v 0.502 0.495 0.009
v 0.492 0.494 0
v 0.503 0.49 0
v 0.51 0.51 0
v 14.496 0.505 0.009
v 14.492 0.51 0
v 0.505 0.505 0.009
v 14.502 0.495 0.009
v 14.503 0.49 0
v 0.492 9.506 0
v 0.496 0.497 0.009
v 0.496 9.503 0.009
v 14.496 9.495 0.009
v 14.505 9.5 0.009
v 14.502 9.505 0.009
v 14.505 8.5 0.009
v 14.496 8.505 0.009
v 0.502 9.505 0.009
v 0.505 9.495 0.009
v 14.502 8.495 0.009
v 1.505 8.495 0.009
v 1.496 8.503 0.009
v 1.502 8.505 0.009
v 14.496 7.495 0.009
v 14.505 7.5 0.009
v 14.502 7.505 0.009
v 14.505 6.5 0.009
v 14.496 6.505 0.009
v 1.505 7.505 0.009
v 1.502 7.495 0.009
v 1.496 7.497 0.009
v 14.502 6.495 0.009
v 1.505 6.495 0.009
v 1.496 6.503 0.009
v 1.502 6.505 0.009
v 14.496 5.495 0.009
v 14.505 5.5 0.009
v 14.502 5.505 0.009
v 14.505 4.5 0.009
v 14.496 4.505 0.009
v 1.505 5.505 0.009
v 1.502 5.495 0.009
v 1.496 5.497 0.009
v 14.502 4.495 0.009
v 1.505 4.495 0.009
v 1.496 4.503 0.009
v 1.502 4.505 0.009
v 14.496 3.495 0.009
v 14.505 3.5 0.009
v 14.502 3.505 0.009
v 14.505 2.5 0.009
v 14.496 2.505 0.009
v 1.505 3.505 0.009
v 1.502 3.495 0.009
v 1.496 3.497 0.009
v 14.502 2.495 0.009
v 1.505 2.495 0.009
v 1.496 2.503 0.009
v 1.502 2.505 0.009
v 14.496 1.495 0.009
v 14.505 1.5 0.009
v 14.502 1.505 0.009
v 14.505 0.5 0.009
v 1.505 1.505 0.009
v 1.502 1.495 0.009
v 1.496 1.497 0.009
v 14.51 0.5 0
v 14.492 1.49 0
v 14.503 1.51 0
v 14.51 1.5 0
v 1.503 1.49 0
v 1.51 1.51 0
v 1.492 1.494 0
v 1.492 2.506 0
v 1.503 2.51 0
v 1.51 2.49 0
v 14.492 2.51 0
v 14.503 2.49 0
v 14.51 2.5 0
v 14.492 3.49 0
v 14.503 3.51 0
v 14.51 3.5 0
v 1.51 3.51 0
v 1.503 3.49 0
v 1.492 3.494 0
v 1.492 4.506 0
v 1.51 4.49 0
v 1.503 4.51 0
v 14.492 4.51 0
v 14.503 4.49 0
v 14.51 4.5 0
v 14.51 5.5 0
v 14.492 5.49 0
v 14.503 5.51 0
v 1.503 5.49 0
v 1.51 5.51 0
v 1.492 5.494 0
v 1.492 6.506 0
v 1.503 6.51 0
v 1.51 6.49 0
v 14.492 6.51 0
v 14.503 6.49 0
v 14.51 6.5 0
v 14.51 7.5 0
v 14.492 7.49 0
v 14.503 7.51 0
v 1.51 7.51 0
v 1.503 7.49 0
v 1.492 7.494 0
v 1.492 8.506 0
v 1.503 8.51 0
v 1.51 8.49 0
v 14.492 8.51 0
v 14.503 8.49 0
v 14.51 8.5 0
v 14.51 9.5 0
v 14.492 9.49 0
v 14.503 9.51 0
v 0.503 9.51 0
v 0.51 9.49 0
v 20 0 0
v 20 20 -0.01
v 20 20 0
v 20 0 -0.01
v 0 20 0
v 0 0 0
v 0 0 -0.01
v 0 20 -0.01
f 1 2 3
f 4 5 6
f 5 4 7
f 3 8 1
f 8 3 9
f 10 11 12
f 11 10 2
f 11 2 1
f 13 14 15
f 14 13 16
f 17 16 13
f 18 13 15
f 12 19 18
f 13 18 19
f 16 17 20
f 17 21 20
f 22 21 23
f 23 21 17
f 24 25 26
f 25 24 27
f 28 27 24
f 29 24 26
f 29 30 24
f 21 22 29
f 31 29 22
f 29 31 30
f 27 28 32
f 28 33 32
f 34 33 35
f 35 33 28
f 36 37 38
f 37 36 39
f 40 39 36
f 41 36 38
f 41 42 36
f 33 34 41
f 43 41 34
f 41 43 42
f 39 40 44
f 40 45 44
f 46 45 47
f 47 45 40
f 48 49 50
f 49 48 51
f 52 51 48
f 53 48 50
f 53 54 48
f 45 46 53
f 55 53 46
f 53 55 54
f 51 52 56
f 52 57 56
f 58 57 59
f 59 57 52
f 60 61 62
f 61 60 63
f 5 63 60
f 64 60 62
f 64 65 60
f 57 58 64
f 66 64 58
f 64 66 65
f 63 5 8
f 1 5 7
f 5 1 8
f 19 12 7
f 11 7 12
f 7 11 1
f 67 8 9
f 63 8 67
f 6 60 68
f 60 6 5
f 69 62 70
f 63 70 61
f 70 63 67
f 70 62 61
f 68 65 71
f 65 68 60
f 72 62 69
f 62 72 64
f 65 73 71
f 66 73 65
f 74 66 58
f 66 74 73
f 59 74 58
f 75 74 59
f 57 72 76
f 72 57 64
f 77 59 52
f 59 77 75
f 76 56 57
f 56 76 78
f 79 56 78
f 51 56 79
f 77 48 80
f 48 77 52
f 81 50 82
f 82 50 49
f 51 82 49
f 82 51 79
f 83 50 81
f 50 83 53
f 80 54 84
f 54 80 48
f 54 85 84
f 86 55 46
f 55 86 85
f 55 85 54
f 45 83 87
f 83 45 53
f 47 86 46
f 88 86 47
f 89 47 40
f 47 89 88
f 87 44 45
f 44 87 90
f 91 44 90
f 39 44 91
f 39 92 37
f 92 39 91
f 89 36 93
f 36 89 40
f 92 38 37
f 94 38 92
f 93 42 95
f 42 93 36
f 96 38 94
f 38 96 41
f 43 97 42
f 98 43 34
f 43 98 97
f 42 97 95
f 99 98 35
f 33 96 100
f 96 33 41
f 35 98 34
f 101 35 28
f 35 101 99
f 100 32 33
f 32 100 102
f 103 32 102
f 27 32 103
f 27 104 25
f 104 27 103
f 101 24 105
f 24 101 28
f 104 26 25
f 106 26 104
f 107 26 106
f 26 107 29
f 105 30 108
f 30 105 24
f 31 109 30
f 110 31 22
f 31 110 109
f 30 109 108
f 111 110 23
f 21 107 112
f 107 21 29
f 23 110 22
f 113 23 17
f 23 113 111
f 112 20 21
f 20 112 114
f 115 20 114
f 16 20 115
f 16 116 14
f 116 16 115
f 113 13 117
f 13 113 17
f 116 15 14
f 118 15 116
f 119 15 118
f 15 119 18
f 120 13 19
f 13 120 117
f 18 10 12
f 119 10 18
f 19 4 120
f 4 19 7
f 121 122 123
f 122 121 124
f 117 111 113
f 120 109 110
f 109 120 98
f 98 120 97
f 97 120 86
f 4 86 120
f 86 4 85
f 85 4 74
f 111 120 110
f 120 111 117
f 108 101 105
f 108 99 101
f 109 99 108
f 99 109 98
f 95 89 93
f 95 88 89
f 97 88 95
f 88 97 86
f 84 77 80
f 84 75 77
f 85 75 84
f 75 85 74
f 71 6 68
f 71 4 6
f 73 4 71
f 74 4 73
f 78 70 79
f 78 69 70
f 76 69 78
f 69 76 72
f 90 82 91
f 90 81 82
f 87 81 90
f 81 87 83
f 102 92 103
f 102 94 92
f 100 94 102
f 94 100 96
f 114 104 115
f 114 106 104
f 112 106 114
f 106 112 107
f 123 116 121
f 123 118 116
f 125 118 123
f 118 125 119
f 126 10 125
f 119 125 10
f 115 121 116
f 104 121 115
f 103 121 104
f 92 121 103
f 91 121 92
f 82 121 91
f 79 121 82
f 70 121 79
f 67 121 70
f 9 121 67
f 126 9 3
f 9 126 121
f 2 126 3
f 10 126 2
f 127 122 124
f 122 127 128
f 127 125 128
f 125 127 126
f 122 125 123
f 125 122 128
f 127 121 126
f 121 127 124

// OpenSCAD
hull(){
    translate([0.5, 0.5]) sphere(0.01);
    translate([1.5, 0.5]) sphere(0.01);
}
hull(){
    translate([1.5, 0.5]) sphere(0.01);
    translate([2.5, 0.5]) sphere(0.01);
}
hull(){
    translate([2.5, 0.5]) sphere(0.01);
    translate([3.5, 0.5]) sphere(0.01);
}
hull(){
    translate([3.5, 0.5]) sphere(0.01);
    translate([4.5, 0.5]) sphere(0.01);
}
hull(){
    translate([4.5, 0.5]) sphere(0.01);
    translate([5.5, 0.5]) sphere(0.01);
}
hull(){
    translate([5.5, 0.5]) sphere(0.01);
    translate([6.5, 0.5]) sphere(0.01);
}
hull(){
    translate([6.5, 0.5]) sphere(0.01);
    translate([7.5, 0.5]) sphere(0.01);
}
hull(){
    translate([7.5, 0.5]) sphere(0.01);
    translate([8.5, 0.5]) sphere(0.01);
}
hull(){
    translate([8.5, 0.5]) sphere(0.01);
    translate([9.5, 0.5]) sphere(0.01);
}
hull(){
    translate([9.5, 0.5]) sphere(0.01);
    translate([10.5, 0.5]) sphere(0.01);
}
hull(){
    translate([10.5, 0.5]) sphere(0.01);
    translate([11.5, 0.5]) sphere(0.01);
}
hull(){
    translate([11.5, 0.5]) sphere(0.01);
    translate([12.5, 0.5]) sphere(0.01);
}
hull(){
    translate([12.5, 0.5]) sphere(0.01);
    translate([13.5, 0.5]) sphere(0.01);
}
hull(){
    translate([13.5, 0.5]) sphere(0.01);
    translate([14.5, 0.5]) sphere(0.01);
}
hull(){
    translate([14.5, 0.5]) sphere(0.01);
    translate([14.5, 1.5]) sphere(0.01);
}
hull(){
    translate([14.5, 1.5]) sphere(0.01);
    translate([13.5, 1.5]) sphere(0.01);
}
hull(){
    translate([13.5, 1.5]) sphere(0.01);
    translate([12.5, 1.5]) sphere(0.01);
}
hull(){
    translate([12.5, 1.5]) sphere(0.01);
    translate([11.5, 1.5]) sphere(0.01);
}
hull(){
    translate([11.5, 1.5]) sphere(0.01);
    translate([10.5, 1.5]) sphere(0.01);
}
hull(){
    translate([10.5, 1.5]) sphere(0.01);
    translate([9.5, 1.5]) sphere(0.01);
}
hull(){
    translate([9.5, 1.5]) sphere(0.01);
    translate([8.5, 1.5]) sphere(0.01);
}
hull(){
    translate([8.5, 1.5]) sphere(0.01);
    translate([7.5, 1.5]) sphere(0.01);
}
hull(){
    translate([7.5, 1.5]) sphere(0.01);
    translate([6.5, 1.5]) sphere(0.01);
}
hull(){
    translate([6.5, 1.5]) sphere(0.01);
    translate([5.5, 1.5]) sphere(0.01);
}
hull(){
    translate([5.5, 1.5]) sphere(0.01);
    translate([4.5, 1.5]) sphere(0.01);
}
hull(){
    translate([4.5, 1.5]) sphere(0.01);
    translate([3.5, 1.5]) sphere(0.01);
}
hull(){
    translate([3.5, 1.5]) sphere(0.01);
    translate([2.5, 1.5]) sphere(0.01);
}
hull(){
    translate([2.5, 1.5]) sphere(0.01);
    translate([1.5, 1.5]) sphere(0.01);
}
hull(){
    translate([1.5, 1.5]) sphere(0.01);
    translate([1.5, 2.5]) sphere(0.01);
}
hull(){
    translate([1.5, 2.5]) sphere(0.01);
    translate([2.5, 2.5]) sphere(0.01);
}
hull(){
    translate([2.5, 2.5]) sphere(0.01);
    translate([3.5, 2.5]) sphere(0.01);
}
hull(){
    translate([3.5, 2.5]) sphere(0.01);
    translate([4.5, 2.5]) sphere(0.01);
}
hull(){
    translate([4.5, 2.5]) sphere(0.01);
    translate([5.5, 2.5]) sphere(0.01);
}
hull(){
    translate([5.5, 2.5]) sphere(0.01);
    translate([6.5, 2.5]) sphere(0.01);
}
hull(){
    translate([6.5, 2.5]) sphere(0.01);
    translate([7.5, 2.5]) sphere(0.01);
}
hull(){
    translate([7.5, 2.5]) sphere(0.01);
    translate([8.5, 2.5]) sphere(0.01);
}
hull(){
    translate([8.5, 2.5]) sphere(0.01);
    translate([9.5, 2.5]) sphere(0.01);
}
hull(){
    translate([9.5, 2.5]) sphere(0.01);
    translate([10.5, 2.5]) sphere(0.01);
}
hull(){
    translate([10.5, 2.5]) sphere(0.01);
    translate([11.5, 2.5]) sphere(0.01);
}
hull(){
    translate([11.5, 2.5]) sphere(0.01);
    translate([12.5, 2.5]) sphere(0.01);
}
hull(){
    translate([12.5, 2.5]) sphere(0.01);
    translate([13.5, 2.5]) sphere(0.01);
}
hull(){
    translate([13.5, 2.5]) sphere(0.01);
    translate([14.5, 2.5]) sphere(0.01);
}
hull(){
    translate([14.5, 2.5]) sphere(0.01);
    translate([14.5, 3.5]) sphere(0.01);
}
hull(){
    translate([14.5, 3.5]) sphere(0.01);
    translate([13.5, 3.5]) sphere(0.01);
}
hull(){
    translate([13.5, 3.5]) sphere(0.01);
    translate([12.5, 3.5]) sphere(0.01);
}
hull(){
    translate([12.5, 3.5]) sphere(0.01);
    translate([11.5, 3.5]) sphere(0.01);
}
hull(){
    translate([11.5, 3.5]) sphere(0.01);
    translate([10.5, 3.5]) sphere(0.01);
}
hull(){
    translate([10.5, 3.5]) sphere(0.01);
    translate([9.5, 3.5]) sphere(0.01);
}
hull(){
    translate([9.5, 3.5]) sphere(0.01);
    translate([8.5, 3.5]) sphere(0.01);
}
hull(){
    translate([8.5, 3.5]) sphere(0.01);
    translate([7.5, 3.5]) sphere(0.01);
}
hull(){
    translate([7.5, 3.5]) sphere(0.01);
    translate([6.5, 3.5]) sphere(0.01);
}
hull(){
    translate([6.5, 3.5]) sphere(0.01);
    translate([5.5, 3.5]) sphere(0.01);
}
hull(){
    translate([5.5, 3.5]) sphere(0.01);
    translate([4.5, 3.5]) sphere(0.01);
}
hull(){
    translate([4.5, 3.5]) sphere(0.01);
    translate([3.5, 3.5]) sphere(0.01);
}
hull(){
    translate([3.5, 3.5]) sphere(0.01);
    translate([2.5, 3.5]) sphere(0.01);
}
hull(){
    translate([2.5, 3.5]) sphere(0.01);
    translate([1.5, 3.5]) sphere(0.01);
}
hull(){
    translate([1.5, 3.5]) sphere(0.01);
    translate([1.5, 4.5]) sphere(0.01);
}
hull(){
    translate([1.5, 4.5]) sphere(0.01);
    translate([2.5, 4.5]) sphere(0.01);
}
hull(){
    translate([2.5, 4.5]) sphere(0.01);
    translate([3.5, 4.5]) sphere(0.01);
}
hull(){
    translate([3.5, 4.5]) sphere(0.01);
    translate([4.5, 4.5]) sphere(0.01);
}
hull(){
    translate([4.5, 4.5]) sphere(0.01);
    translate([5.5, 4.5]) sphere(0.01);
}
hull(){
    translate([5.5, 4.5]) sphere(0.01);
    translate([6.5, 4.5]) sphere(0.01);
}
hull(){
    translate([6.5, 4.5]) sphere(0.01);
    translate([7.5, 4.5]) sphere(0.01);
}
hull(){
    translate([7.5, 4.5]) sphere(0.01);
    translate([8.5, 4.5]) sphere(0.01);
}
hull(){
    translate([8.5, 4.5]) sphere(0.01);
    translate([9.5, 4.5]) sphere(0.01);
}
hull(){
    translate([9.5, 4.5]) sphere(0.01);
    translate([10.5, 4.5]) sphere(0.01);
}
hull(){
    translate([10.5, 4.5]) sphere(0.01);
    translate([11.5, 4.5]) sphere(0.01);
}
hull(){
    translate([11.5, 4.5]) sphere(0.01);
    translate([12.5, 4.5]) sphere(0.01);
}
hull(){
    translate([12.5, 4.5]) sphere(0.01);
    translate([13.5, 4.5]) sphere(0.01);
}
hull(){
    translate([13.5, 4.5]) sphere(0.01);
    translate([14.5, 4.5]) sphere(0.01);
}
hull(){
    translate([14.5, 4.5]) sphere(0.01);
    translate([14.5, 5.5]) sphere(0.01);
}
hull(){
    translate([14.5, 5.5]) sphere(0.01);
    translate([13.5, 5.5]) sphere(0.01);
}
hull(){
    translate([13.5, 5.5]) sphere(0.01);
    translate([12.5, 5.5]) sphere(0.01);
}
hull(){
    translate([12.5, 5.5]) sphere(0.01);
    translate([11.5, 5.5]) sphere(0.01);
}
hull(){
    translate([11.5, 5.5]) sphere(0.01);
    translate([10.5, 5.5]) sphere(0.01);
}
hull(){
    translate([10.5, 5.5]) sphere(0.01);
    translate([9.5, 5.5]) sphere(0.01);
}
hull(){
    translate([9.5, 5.5]) sphere(0.01);
    translate([8.5, 5.5]) sphere(0.01);
}
hull(){
    translate([8.5, 5.5]) sphere(0.01);
    translate([7.5, 5.5]) sphere(0.01);
}
hull(){
    translate([7.5, 5.5]) sphere(0.01);
    translate([6.5, 5.5]) sphere(0.01);
}
hull(){
    translate([6.5, 5.5]) sphere(0.01);
    translate([5.5, 5.5]) sphere(0.01);
}
hull(){
    translate([5.5, 5.5]) sphere(0.01);
    translate([4.5, 5.5]) sphere(0.01);
}
hull(){
    translate([4.5, 5.5]) sphere(0.01);
    translate([3.5, 5.5]) sphere(0.01);
}
hull(){
    translate([3.5, 5.5]) sphere(0.01);
    translate([2.5, 5.5]) sphere(0.01);
}
hull(){
    translate([2.5, 5.5]) sphere(0.01);
    translate([1.5, 5.5]) sphere(0.01);
}
hull(){
    translate([1.5, 5.5]) sphere(0.01);
    translate([1.5, 6.5]) sphere(0.01);
}
hull(){
    translate([1.5, 6.5]) sphere(0.01);
    translate([2.5, 6.5]) sphere(0.01);
}
hull(){
    translate([2.5, 6.5]) sphere(0.01);
    translate([3.5, 6.5]) sphere(0.01);
}
hull(){
    translate([3.5, 6.5]) sphere(0.01);
    translate([4.5, 6.5]) sphere(0.01);
}
hull(){
    translate([4.5, 6.5]) sphere(0.01);
    translate([5.5, 6.5]) sphere(0.01);
}
hull(){
    translate([5.5, 6.5]) sphere(0.01);
    translate([6.5, 6.5]) sphere(0.01);
}
hull(){
    translate([6.5, 6.5]) sphere(0.01);
    translate([7.5, 6.5]) sphere(0.01);
}
hull(){
    translate([7.5, 6.5]) sphere(0.01);
    translate([8.5, 6.5]) sphere(0.01);
}
hull(){
    translate([8.5, 6.5]) sphere(0.01);
    translate([9.5, 6.5]) sphere(0.01);
}
hull(){
    translate([9.5, 6.5]) sphere(0.01);
    translate([10.5, 6.5]) sphere(0.01);
}
hull(){
    translate([10.5, 6.5]) sphere(0.01);
    translate([11.5, 6.5]) sphere(0.01);
}
hull(){
    translate([11.5, 6.5]) sphere(0.01);
    translate([12.5, 6.5]) sphere(0.01);
}
hull(){
    translate([12.5, 6.5]) sphere(0.01);
    translate([13.5, 6.5]) sphere(0.01);
}
hull(){
    translate([13.5, 6.5]) sphere(0.01);
    translate([14.5, 6.5]) sphere(0.01);
}
hull(){
    translate([14.5, 6.5]) sphere(0.01);
    translate([14.5, 7.5]) sphere(0.01);
}
hull(){
    translate([14.5, 7.5]) sphere(0.01);
    translate([13.5, 7.5]) sphere(0.01);
}
hull(){
    translate([13.5, 7.5]) sphere(0.01);
    translate([12.5, 7.5]) sphere(0.01);
}
hull(){
    translate([12.5, 7.5]) sphere(0.01);
    translate([11.5, 7.5]) sphere(0.01);
}
hull(){
    translate([11.5, 7.5]) sphere(0.01);
    translate([10.5, 7.5]) sphere(0.01);
}
hull(){
    translate([10.5, 7.5]) sphere(0.01);
    translate([9.5, 7.5]) sphere(0.01);
}
hull(){
    translate([9.5, 7.5]) sphere(0.01);
    translate([8.5, 7.5]) sphere(0.01);
}
hull(){
    translate([8.5, 7.5]) sphere(0.01);
    translate([7.5, 7.5]) sphere(0.01);
}
hull(){
    translate([7.5, 7.5]) sphere(0.01);
    translate([6.5, 7.5]) sphere(0.01);
}
hull(){
    translate([6.5, 7.5]) sphere(0.01);
    translate([5.5, 7.5]) sphere(0.01);
}
hull(){
    translate([5.5, 7.5]) sphere(0.01);
    translate([4.5, 7.5]) sphere(0.01);
}
hull(){
    translate([4.5, 7.5]) sphere(0.01);
    translate([3.5, 7.5]) sphere(0.01);
}
hull(){
    translate([3.5, 7.5]) sphere(0.01);
    translate([2.5, 7.5]) sphere(0.01);
}
hull(){
    translate([2.5, 7.5]) sphere(0.01);
    translate([1.5, 7.5]) sphere(0.01);
}
hull(){
    translate([1.5, 7.5]) sphere(0.01);
    translate([1.5, 8.5]) sphere(0.01);
}
hull(){
    translate([1.5, 8.5]) sphere(0.01);
    translate([2.5, 8.5]) sphere(0.01);
}
hull(){
    translate([2.5, 8.5]) sphere(0.01);
    translate([3.5, 8.5]) sphere(0.01);
}
hull(){
    translate([3.5, 8.5]) sphere(0.01);
    translate([4.5, 8.5]) sphere(0.01);
}
hull(){
    translate([4.5, 8.5]) sphere(0.01);
    translate([5.5, 8.5]) sphere(0.01);
}
hull(){
    translate([5.5, 8.5]) sphere(0.01);
    translate([6.5, 8.5]) sphere(0.01);
}
hull(){
    translate([6.5, 8.5]) sphere(0.01);
    translate([7.5, 8.5]) sphere(0.01);
}
hull(){
    translate([7.5, 8.5]) sphere(0.01);
    translate([8.5, 8.5]) sphere(0.01);
}
hull(){
    translate([8.5, 8.5]) sphere(0.01);
    translate([9.5, 8.5]) sphere(0.01);
}
hull(){
    translate([9.5, 8.5]) sphere(0.01);
    translate([10.5, 8.5]) sphere(0.01);
}
hull(){
    translate([10.5, 8.5]) sphere(0.01);
    translate([11.5, 8.5]) sphere(0.01);
}
hull(){
    translate([11.5, 8.5]) sphere(0.01);
    translate([12.5, 8.5]) sphere(0.01);
}
hull(){
    translate([12.5, 8.5]) sphere(0.01);
    translate([13.5, 8.5]) sphere(0.01);
}
hull(){
    translate([13.5, 8.5]) sphere(0.01);
    translate([14.5, 8.5]) sphere(0.01);
}
hull(){
    translate([14.5, 8.5]) sphere(0.01);
    translate([14.5, 9.5]) sphere(0.01);
}
hull(){
    translate([14.5, 9.5]) sphere(0.01);
    translate([13.5, 9.5]) sphere(0.01);
}
hull(){
    translate([13.5, 9.5]) sphere(0.01);
    translate([12.5, 9.5]) sphere(0.01);
}
hull(){
    translate([12.5, 9.5]) sphere(0.01);
    translate([11.5, 9.5]) sphere(0.01);
}
hull(){
    translate([11.5, 9.5]) sphere(0.01);
    translate([10.5, 9.5]) sphere(0.01);
}
hull(){
    translate([10.5, 9.5]) sphere(0.01);
    translate([9.5, 9.5]) sphere(0.01);
}
hull(){
    translate([9.5, 9.5]) sphere(0.01);
    translate([8.5, 9.5]) sphere(0.01);
}
hull(){
    translate([8.5, 9.5]) sphere(0.01);
    translate([7.5, 9.5]) sphere(0.01);
}
hull(){
    translate([7.5, 9.5]) sphere(0.01);
    translate([6.5, 9.5]) sphere(0.01);
}
hull(){
    translate([6.5, 9.5]) sphere(0.01);
    translate([5.5, 9.5]) sphere(0.01);
}
hull(){
    translate([5.5, 9.5]) sphere(0.01);
    translate([4.5, 9.5]) sphere(0.01);
}
hull(){
    translate([4.5, 9.5]) sphere(0.01);
    translate([3.5, 9.5]) sphere(0.01);
}
hull(){
    translate([3.5, 9.5]) sphere(0.01);
    translate([2.5, 9.5]) sphere(0.01);
}
hull(){
    translate([2.5, 9.5]) sphere(0.01);
    translate([1.5, 9.5]) sphere(0.01);
}
hull(){
    translate([1.5, 9.5]) sphere(0.01);
    translate([0.5, 9.5]) sphere(0.01);
}
hull(){
    translate([0.5, 9.5]) sphere(0.01);
    translate([0.5, 8.5]) sphere(0.01);
}
hull(){
    translate([0.5, 8.5]) sphere(0.01);
    translate([0.5, 7.5]) sphere(0.01);
}
hull(){
    translate([0.5, 7.5]) sphere(0.01);
    translate([0.5, 6.5]) sphere(0.01);
}
hull(){
    translate([0.5, 6.5]) sphere(0.01);
    translate([0.5, 5.5]) sphere(0.01);
}
hull(){
    translate([0.5, 5.5]) sphere(0.01);
    translate([0.5, 4.5]) sphere(0.01);
}
hull(){
    translate([0.5, 4.5]) sphere(0.01);
    translate([0.5, 3.5]) sphere(0.01);
}
hull(){
    translate([0.5, 3.5]) sphere(0.01);
    translate([0.5, 2.5]) sphere(0.01);
}
hull(){
    translate([0.5, 2.5]) sphere(0.01);
    translate([0.5, 1.5]) sphere(0.01);
}
hull(){
    translate([0.5, 1.5]) sphere(0.01);
    translate([0.5, 0.5]) sphere(0.01);
}
translate([0,0,-0.01]) color([0.1,0.1,0.1]) cube([20,20,0.01]);
